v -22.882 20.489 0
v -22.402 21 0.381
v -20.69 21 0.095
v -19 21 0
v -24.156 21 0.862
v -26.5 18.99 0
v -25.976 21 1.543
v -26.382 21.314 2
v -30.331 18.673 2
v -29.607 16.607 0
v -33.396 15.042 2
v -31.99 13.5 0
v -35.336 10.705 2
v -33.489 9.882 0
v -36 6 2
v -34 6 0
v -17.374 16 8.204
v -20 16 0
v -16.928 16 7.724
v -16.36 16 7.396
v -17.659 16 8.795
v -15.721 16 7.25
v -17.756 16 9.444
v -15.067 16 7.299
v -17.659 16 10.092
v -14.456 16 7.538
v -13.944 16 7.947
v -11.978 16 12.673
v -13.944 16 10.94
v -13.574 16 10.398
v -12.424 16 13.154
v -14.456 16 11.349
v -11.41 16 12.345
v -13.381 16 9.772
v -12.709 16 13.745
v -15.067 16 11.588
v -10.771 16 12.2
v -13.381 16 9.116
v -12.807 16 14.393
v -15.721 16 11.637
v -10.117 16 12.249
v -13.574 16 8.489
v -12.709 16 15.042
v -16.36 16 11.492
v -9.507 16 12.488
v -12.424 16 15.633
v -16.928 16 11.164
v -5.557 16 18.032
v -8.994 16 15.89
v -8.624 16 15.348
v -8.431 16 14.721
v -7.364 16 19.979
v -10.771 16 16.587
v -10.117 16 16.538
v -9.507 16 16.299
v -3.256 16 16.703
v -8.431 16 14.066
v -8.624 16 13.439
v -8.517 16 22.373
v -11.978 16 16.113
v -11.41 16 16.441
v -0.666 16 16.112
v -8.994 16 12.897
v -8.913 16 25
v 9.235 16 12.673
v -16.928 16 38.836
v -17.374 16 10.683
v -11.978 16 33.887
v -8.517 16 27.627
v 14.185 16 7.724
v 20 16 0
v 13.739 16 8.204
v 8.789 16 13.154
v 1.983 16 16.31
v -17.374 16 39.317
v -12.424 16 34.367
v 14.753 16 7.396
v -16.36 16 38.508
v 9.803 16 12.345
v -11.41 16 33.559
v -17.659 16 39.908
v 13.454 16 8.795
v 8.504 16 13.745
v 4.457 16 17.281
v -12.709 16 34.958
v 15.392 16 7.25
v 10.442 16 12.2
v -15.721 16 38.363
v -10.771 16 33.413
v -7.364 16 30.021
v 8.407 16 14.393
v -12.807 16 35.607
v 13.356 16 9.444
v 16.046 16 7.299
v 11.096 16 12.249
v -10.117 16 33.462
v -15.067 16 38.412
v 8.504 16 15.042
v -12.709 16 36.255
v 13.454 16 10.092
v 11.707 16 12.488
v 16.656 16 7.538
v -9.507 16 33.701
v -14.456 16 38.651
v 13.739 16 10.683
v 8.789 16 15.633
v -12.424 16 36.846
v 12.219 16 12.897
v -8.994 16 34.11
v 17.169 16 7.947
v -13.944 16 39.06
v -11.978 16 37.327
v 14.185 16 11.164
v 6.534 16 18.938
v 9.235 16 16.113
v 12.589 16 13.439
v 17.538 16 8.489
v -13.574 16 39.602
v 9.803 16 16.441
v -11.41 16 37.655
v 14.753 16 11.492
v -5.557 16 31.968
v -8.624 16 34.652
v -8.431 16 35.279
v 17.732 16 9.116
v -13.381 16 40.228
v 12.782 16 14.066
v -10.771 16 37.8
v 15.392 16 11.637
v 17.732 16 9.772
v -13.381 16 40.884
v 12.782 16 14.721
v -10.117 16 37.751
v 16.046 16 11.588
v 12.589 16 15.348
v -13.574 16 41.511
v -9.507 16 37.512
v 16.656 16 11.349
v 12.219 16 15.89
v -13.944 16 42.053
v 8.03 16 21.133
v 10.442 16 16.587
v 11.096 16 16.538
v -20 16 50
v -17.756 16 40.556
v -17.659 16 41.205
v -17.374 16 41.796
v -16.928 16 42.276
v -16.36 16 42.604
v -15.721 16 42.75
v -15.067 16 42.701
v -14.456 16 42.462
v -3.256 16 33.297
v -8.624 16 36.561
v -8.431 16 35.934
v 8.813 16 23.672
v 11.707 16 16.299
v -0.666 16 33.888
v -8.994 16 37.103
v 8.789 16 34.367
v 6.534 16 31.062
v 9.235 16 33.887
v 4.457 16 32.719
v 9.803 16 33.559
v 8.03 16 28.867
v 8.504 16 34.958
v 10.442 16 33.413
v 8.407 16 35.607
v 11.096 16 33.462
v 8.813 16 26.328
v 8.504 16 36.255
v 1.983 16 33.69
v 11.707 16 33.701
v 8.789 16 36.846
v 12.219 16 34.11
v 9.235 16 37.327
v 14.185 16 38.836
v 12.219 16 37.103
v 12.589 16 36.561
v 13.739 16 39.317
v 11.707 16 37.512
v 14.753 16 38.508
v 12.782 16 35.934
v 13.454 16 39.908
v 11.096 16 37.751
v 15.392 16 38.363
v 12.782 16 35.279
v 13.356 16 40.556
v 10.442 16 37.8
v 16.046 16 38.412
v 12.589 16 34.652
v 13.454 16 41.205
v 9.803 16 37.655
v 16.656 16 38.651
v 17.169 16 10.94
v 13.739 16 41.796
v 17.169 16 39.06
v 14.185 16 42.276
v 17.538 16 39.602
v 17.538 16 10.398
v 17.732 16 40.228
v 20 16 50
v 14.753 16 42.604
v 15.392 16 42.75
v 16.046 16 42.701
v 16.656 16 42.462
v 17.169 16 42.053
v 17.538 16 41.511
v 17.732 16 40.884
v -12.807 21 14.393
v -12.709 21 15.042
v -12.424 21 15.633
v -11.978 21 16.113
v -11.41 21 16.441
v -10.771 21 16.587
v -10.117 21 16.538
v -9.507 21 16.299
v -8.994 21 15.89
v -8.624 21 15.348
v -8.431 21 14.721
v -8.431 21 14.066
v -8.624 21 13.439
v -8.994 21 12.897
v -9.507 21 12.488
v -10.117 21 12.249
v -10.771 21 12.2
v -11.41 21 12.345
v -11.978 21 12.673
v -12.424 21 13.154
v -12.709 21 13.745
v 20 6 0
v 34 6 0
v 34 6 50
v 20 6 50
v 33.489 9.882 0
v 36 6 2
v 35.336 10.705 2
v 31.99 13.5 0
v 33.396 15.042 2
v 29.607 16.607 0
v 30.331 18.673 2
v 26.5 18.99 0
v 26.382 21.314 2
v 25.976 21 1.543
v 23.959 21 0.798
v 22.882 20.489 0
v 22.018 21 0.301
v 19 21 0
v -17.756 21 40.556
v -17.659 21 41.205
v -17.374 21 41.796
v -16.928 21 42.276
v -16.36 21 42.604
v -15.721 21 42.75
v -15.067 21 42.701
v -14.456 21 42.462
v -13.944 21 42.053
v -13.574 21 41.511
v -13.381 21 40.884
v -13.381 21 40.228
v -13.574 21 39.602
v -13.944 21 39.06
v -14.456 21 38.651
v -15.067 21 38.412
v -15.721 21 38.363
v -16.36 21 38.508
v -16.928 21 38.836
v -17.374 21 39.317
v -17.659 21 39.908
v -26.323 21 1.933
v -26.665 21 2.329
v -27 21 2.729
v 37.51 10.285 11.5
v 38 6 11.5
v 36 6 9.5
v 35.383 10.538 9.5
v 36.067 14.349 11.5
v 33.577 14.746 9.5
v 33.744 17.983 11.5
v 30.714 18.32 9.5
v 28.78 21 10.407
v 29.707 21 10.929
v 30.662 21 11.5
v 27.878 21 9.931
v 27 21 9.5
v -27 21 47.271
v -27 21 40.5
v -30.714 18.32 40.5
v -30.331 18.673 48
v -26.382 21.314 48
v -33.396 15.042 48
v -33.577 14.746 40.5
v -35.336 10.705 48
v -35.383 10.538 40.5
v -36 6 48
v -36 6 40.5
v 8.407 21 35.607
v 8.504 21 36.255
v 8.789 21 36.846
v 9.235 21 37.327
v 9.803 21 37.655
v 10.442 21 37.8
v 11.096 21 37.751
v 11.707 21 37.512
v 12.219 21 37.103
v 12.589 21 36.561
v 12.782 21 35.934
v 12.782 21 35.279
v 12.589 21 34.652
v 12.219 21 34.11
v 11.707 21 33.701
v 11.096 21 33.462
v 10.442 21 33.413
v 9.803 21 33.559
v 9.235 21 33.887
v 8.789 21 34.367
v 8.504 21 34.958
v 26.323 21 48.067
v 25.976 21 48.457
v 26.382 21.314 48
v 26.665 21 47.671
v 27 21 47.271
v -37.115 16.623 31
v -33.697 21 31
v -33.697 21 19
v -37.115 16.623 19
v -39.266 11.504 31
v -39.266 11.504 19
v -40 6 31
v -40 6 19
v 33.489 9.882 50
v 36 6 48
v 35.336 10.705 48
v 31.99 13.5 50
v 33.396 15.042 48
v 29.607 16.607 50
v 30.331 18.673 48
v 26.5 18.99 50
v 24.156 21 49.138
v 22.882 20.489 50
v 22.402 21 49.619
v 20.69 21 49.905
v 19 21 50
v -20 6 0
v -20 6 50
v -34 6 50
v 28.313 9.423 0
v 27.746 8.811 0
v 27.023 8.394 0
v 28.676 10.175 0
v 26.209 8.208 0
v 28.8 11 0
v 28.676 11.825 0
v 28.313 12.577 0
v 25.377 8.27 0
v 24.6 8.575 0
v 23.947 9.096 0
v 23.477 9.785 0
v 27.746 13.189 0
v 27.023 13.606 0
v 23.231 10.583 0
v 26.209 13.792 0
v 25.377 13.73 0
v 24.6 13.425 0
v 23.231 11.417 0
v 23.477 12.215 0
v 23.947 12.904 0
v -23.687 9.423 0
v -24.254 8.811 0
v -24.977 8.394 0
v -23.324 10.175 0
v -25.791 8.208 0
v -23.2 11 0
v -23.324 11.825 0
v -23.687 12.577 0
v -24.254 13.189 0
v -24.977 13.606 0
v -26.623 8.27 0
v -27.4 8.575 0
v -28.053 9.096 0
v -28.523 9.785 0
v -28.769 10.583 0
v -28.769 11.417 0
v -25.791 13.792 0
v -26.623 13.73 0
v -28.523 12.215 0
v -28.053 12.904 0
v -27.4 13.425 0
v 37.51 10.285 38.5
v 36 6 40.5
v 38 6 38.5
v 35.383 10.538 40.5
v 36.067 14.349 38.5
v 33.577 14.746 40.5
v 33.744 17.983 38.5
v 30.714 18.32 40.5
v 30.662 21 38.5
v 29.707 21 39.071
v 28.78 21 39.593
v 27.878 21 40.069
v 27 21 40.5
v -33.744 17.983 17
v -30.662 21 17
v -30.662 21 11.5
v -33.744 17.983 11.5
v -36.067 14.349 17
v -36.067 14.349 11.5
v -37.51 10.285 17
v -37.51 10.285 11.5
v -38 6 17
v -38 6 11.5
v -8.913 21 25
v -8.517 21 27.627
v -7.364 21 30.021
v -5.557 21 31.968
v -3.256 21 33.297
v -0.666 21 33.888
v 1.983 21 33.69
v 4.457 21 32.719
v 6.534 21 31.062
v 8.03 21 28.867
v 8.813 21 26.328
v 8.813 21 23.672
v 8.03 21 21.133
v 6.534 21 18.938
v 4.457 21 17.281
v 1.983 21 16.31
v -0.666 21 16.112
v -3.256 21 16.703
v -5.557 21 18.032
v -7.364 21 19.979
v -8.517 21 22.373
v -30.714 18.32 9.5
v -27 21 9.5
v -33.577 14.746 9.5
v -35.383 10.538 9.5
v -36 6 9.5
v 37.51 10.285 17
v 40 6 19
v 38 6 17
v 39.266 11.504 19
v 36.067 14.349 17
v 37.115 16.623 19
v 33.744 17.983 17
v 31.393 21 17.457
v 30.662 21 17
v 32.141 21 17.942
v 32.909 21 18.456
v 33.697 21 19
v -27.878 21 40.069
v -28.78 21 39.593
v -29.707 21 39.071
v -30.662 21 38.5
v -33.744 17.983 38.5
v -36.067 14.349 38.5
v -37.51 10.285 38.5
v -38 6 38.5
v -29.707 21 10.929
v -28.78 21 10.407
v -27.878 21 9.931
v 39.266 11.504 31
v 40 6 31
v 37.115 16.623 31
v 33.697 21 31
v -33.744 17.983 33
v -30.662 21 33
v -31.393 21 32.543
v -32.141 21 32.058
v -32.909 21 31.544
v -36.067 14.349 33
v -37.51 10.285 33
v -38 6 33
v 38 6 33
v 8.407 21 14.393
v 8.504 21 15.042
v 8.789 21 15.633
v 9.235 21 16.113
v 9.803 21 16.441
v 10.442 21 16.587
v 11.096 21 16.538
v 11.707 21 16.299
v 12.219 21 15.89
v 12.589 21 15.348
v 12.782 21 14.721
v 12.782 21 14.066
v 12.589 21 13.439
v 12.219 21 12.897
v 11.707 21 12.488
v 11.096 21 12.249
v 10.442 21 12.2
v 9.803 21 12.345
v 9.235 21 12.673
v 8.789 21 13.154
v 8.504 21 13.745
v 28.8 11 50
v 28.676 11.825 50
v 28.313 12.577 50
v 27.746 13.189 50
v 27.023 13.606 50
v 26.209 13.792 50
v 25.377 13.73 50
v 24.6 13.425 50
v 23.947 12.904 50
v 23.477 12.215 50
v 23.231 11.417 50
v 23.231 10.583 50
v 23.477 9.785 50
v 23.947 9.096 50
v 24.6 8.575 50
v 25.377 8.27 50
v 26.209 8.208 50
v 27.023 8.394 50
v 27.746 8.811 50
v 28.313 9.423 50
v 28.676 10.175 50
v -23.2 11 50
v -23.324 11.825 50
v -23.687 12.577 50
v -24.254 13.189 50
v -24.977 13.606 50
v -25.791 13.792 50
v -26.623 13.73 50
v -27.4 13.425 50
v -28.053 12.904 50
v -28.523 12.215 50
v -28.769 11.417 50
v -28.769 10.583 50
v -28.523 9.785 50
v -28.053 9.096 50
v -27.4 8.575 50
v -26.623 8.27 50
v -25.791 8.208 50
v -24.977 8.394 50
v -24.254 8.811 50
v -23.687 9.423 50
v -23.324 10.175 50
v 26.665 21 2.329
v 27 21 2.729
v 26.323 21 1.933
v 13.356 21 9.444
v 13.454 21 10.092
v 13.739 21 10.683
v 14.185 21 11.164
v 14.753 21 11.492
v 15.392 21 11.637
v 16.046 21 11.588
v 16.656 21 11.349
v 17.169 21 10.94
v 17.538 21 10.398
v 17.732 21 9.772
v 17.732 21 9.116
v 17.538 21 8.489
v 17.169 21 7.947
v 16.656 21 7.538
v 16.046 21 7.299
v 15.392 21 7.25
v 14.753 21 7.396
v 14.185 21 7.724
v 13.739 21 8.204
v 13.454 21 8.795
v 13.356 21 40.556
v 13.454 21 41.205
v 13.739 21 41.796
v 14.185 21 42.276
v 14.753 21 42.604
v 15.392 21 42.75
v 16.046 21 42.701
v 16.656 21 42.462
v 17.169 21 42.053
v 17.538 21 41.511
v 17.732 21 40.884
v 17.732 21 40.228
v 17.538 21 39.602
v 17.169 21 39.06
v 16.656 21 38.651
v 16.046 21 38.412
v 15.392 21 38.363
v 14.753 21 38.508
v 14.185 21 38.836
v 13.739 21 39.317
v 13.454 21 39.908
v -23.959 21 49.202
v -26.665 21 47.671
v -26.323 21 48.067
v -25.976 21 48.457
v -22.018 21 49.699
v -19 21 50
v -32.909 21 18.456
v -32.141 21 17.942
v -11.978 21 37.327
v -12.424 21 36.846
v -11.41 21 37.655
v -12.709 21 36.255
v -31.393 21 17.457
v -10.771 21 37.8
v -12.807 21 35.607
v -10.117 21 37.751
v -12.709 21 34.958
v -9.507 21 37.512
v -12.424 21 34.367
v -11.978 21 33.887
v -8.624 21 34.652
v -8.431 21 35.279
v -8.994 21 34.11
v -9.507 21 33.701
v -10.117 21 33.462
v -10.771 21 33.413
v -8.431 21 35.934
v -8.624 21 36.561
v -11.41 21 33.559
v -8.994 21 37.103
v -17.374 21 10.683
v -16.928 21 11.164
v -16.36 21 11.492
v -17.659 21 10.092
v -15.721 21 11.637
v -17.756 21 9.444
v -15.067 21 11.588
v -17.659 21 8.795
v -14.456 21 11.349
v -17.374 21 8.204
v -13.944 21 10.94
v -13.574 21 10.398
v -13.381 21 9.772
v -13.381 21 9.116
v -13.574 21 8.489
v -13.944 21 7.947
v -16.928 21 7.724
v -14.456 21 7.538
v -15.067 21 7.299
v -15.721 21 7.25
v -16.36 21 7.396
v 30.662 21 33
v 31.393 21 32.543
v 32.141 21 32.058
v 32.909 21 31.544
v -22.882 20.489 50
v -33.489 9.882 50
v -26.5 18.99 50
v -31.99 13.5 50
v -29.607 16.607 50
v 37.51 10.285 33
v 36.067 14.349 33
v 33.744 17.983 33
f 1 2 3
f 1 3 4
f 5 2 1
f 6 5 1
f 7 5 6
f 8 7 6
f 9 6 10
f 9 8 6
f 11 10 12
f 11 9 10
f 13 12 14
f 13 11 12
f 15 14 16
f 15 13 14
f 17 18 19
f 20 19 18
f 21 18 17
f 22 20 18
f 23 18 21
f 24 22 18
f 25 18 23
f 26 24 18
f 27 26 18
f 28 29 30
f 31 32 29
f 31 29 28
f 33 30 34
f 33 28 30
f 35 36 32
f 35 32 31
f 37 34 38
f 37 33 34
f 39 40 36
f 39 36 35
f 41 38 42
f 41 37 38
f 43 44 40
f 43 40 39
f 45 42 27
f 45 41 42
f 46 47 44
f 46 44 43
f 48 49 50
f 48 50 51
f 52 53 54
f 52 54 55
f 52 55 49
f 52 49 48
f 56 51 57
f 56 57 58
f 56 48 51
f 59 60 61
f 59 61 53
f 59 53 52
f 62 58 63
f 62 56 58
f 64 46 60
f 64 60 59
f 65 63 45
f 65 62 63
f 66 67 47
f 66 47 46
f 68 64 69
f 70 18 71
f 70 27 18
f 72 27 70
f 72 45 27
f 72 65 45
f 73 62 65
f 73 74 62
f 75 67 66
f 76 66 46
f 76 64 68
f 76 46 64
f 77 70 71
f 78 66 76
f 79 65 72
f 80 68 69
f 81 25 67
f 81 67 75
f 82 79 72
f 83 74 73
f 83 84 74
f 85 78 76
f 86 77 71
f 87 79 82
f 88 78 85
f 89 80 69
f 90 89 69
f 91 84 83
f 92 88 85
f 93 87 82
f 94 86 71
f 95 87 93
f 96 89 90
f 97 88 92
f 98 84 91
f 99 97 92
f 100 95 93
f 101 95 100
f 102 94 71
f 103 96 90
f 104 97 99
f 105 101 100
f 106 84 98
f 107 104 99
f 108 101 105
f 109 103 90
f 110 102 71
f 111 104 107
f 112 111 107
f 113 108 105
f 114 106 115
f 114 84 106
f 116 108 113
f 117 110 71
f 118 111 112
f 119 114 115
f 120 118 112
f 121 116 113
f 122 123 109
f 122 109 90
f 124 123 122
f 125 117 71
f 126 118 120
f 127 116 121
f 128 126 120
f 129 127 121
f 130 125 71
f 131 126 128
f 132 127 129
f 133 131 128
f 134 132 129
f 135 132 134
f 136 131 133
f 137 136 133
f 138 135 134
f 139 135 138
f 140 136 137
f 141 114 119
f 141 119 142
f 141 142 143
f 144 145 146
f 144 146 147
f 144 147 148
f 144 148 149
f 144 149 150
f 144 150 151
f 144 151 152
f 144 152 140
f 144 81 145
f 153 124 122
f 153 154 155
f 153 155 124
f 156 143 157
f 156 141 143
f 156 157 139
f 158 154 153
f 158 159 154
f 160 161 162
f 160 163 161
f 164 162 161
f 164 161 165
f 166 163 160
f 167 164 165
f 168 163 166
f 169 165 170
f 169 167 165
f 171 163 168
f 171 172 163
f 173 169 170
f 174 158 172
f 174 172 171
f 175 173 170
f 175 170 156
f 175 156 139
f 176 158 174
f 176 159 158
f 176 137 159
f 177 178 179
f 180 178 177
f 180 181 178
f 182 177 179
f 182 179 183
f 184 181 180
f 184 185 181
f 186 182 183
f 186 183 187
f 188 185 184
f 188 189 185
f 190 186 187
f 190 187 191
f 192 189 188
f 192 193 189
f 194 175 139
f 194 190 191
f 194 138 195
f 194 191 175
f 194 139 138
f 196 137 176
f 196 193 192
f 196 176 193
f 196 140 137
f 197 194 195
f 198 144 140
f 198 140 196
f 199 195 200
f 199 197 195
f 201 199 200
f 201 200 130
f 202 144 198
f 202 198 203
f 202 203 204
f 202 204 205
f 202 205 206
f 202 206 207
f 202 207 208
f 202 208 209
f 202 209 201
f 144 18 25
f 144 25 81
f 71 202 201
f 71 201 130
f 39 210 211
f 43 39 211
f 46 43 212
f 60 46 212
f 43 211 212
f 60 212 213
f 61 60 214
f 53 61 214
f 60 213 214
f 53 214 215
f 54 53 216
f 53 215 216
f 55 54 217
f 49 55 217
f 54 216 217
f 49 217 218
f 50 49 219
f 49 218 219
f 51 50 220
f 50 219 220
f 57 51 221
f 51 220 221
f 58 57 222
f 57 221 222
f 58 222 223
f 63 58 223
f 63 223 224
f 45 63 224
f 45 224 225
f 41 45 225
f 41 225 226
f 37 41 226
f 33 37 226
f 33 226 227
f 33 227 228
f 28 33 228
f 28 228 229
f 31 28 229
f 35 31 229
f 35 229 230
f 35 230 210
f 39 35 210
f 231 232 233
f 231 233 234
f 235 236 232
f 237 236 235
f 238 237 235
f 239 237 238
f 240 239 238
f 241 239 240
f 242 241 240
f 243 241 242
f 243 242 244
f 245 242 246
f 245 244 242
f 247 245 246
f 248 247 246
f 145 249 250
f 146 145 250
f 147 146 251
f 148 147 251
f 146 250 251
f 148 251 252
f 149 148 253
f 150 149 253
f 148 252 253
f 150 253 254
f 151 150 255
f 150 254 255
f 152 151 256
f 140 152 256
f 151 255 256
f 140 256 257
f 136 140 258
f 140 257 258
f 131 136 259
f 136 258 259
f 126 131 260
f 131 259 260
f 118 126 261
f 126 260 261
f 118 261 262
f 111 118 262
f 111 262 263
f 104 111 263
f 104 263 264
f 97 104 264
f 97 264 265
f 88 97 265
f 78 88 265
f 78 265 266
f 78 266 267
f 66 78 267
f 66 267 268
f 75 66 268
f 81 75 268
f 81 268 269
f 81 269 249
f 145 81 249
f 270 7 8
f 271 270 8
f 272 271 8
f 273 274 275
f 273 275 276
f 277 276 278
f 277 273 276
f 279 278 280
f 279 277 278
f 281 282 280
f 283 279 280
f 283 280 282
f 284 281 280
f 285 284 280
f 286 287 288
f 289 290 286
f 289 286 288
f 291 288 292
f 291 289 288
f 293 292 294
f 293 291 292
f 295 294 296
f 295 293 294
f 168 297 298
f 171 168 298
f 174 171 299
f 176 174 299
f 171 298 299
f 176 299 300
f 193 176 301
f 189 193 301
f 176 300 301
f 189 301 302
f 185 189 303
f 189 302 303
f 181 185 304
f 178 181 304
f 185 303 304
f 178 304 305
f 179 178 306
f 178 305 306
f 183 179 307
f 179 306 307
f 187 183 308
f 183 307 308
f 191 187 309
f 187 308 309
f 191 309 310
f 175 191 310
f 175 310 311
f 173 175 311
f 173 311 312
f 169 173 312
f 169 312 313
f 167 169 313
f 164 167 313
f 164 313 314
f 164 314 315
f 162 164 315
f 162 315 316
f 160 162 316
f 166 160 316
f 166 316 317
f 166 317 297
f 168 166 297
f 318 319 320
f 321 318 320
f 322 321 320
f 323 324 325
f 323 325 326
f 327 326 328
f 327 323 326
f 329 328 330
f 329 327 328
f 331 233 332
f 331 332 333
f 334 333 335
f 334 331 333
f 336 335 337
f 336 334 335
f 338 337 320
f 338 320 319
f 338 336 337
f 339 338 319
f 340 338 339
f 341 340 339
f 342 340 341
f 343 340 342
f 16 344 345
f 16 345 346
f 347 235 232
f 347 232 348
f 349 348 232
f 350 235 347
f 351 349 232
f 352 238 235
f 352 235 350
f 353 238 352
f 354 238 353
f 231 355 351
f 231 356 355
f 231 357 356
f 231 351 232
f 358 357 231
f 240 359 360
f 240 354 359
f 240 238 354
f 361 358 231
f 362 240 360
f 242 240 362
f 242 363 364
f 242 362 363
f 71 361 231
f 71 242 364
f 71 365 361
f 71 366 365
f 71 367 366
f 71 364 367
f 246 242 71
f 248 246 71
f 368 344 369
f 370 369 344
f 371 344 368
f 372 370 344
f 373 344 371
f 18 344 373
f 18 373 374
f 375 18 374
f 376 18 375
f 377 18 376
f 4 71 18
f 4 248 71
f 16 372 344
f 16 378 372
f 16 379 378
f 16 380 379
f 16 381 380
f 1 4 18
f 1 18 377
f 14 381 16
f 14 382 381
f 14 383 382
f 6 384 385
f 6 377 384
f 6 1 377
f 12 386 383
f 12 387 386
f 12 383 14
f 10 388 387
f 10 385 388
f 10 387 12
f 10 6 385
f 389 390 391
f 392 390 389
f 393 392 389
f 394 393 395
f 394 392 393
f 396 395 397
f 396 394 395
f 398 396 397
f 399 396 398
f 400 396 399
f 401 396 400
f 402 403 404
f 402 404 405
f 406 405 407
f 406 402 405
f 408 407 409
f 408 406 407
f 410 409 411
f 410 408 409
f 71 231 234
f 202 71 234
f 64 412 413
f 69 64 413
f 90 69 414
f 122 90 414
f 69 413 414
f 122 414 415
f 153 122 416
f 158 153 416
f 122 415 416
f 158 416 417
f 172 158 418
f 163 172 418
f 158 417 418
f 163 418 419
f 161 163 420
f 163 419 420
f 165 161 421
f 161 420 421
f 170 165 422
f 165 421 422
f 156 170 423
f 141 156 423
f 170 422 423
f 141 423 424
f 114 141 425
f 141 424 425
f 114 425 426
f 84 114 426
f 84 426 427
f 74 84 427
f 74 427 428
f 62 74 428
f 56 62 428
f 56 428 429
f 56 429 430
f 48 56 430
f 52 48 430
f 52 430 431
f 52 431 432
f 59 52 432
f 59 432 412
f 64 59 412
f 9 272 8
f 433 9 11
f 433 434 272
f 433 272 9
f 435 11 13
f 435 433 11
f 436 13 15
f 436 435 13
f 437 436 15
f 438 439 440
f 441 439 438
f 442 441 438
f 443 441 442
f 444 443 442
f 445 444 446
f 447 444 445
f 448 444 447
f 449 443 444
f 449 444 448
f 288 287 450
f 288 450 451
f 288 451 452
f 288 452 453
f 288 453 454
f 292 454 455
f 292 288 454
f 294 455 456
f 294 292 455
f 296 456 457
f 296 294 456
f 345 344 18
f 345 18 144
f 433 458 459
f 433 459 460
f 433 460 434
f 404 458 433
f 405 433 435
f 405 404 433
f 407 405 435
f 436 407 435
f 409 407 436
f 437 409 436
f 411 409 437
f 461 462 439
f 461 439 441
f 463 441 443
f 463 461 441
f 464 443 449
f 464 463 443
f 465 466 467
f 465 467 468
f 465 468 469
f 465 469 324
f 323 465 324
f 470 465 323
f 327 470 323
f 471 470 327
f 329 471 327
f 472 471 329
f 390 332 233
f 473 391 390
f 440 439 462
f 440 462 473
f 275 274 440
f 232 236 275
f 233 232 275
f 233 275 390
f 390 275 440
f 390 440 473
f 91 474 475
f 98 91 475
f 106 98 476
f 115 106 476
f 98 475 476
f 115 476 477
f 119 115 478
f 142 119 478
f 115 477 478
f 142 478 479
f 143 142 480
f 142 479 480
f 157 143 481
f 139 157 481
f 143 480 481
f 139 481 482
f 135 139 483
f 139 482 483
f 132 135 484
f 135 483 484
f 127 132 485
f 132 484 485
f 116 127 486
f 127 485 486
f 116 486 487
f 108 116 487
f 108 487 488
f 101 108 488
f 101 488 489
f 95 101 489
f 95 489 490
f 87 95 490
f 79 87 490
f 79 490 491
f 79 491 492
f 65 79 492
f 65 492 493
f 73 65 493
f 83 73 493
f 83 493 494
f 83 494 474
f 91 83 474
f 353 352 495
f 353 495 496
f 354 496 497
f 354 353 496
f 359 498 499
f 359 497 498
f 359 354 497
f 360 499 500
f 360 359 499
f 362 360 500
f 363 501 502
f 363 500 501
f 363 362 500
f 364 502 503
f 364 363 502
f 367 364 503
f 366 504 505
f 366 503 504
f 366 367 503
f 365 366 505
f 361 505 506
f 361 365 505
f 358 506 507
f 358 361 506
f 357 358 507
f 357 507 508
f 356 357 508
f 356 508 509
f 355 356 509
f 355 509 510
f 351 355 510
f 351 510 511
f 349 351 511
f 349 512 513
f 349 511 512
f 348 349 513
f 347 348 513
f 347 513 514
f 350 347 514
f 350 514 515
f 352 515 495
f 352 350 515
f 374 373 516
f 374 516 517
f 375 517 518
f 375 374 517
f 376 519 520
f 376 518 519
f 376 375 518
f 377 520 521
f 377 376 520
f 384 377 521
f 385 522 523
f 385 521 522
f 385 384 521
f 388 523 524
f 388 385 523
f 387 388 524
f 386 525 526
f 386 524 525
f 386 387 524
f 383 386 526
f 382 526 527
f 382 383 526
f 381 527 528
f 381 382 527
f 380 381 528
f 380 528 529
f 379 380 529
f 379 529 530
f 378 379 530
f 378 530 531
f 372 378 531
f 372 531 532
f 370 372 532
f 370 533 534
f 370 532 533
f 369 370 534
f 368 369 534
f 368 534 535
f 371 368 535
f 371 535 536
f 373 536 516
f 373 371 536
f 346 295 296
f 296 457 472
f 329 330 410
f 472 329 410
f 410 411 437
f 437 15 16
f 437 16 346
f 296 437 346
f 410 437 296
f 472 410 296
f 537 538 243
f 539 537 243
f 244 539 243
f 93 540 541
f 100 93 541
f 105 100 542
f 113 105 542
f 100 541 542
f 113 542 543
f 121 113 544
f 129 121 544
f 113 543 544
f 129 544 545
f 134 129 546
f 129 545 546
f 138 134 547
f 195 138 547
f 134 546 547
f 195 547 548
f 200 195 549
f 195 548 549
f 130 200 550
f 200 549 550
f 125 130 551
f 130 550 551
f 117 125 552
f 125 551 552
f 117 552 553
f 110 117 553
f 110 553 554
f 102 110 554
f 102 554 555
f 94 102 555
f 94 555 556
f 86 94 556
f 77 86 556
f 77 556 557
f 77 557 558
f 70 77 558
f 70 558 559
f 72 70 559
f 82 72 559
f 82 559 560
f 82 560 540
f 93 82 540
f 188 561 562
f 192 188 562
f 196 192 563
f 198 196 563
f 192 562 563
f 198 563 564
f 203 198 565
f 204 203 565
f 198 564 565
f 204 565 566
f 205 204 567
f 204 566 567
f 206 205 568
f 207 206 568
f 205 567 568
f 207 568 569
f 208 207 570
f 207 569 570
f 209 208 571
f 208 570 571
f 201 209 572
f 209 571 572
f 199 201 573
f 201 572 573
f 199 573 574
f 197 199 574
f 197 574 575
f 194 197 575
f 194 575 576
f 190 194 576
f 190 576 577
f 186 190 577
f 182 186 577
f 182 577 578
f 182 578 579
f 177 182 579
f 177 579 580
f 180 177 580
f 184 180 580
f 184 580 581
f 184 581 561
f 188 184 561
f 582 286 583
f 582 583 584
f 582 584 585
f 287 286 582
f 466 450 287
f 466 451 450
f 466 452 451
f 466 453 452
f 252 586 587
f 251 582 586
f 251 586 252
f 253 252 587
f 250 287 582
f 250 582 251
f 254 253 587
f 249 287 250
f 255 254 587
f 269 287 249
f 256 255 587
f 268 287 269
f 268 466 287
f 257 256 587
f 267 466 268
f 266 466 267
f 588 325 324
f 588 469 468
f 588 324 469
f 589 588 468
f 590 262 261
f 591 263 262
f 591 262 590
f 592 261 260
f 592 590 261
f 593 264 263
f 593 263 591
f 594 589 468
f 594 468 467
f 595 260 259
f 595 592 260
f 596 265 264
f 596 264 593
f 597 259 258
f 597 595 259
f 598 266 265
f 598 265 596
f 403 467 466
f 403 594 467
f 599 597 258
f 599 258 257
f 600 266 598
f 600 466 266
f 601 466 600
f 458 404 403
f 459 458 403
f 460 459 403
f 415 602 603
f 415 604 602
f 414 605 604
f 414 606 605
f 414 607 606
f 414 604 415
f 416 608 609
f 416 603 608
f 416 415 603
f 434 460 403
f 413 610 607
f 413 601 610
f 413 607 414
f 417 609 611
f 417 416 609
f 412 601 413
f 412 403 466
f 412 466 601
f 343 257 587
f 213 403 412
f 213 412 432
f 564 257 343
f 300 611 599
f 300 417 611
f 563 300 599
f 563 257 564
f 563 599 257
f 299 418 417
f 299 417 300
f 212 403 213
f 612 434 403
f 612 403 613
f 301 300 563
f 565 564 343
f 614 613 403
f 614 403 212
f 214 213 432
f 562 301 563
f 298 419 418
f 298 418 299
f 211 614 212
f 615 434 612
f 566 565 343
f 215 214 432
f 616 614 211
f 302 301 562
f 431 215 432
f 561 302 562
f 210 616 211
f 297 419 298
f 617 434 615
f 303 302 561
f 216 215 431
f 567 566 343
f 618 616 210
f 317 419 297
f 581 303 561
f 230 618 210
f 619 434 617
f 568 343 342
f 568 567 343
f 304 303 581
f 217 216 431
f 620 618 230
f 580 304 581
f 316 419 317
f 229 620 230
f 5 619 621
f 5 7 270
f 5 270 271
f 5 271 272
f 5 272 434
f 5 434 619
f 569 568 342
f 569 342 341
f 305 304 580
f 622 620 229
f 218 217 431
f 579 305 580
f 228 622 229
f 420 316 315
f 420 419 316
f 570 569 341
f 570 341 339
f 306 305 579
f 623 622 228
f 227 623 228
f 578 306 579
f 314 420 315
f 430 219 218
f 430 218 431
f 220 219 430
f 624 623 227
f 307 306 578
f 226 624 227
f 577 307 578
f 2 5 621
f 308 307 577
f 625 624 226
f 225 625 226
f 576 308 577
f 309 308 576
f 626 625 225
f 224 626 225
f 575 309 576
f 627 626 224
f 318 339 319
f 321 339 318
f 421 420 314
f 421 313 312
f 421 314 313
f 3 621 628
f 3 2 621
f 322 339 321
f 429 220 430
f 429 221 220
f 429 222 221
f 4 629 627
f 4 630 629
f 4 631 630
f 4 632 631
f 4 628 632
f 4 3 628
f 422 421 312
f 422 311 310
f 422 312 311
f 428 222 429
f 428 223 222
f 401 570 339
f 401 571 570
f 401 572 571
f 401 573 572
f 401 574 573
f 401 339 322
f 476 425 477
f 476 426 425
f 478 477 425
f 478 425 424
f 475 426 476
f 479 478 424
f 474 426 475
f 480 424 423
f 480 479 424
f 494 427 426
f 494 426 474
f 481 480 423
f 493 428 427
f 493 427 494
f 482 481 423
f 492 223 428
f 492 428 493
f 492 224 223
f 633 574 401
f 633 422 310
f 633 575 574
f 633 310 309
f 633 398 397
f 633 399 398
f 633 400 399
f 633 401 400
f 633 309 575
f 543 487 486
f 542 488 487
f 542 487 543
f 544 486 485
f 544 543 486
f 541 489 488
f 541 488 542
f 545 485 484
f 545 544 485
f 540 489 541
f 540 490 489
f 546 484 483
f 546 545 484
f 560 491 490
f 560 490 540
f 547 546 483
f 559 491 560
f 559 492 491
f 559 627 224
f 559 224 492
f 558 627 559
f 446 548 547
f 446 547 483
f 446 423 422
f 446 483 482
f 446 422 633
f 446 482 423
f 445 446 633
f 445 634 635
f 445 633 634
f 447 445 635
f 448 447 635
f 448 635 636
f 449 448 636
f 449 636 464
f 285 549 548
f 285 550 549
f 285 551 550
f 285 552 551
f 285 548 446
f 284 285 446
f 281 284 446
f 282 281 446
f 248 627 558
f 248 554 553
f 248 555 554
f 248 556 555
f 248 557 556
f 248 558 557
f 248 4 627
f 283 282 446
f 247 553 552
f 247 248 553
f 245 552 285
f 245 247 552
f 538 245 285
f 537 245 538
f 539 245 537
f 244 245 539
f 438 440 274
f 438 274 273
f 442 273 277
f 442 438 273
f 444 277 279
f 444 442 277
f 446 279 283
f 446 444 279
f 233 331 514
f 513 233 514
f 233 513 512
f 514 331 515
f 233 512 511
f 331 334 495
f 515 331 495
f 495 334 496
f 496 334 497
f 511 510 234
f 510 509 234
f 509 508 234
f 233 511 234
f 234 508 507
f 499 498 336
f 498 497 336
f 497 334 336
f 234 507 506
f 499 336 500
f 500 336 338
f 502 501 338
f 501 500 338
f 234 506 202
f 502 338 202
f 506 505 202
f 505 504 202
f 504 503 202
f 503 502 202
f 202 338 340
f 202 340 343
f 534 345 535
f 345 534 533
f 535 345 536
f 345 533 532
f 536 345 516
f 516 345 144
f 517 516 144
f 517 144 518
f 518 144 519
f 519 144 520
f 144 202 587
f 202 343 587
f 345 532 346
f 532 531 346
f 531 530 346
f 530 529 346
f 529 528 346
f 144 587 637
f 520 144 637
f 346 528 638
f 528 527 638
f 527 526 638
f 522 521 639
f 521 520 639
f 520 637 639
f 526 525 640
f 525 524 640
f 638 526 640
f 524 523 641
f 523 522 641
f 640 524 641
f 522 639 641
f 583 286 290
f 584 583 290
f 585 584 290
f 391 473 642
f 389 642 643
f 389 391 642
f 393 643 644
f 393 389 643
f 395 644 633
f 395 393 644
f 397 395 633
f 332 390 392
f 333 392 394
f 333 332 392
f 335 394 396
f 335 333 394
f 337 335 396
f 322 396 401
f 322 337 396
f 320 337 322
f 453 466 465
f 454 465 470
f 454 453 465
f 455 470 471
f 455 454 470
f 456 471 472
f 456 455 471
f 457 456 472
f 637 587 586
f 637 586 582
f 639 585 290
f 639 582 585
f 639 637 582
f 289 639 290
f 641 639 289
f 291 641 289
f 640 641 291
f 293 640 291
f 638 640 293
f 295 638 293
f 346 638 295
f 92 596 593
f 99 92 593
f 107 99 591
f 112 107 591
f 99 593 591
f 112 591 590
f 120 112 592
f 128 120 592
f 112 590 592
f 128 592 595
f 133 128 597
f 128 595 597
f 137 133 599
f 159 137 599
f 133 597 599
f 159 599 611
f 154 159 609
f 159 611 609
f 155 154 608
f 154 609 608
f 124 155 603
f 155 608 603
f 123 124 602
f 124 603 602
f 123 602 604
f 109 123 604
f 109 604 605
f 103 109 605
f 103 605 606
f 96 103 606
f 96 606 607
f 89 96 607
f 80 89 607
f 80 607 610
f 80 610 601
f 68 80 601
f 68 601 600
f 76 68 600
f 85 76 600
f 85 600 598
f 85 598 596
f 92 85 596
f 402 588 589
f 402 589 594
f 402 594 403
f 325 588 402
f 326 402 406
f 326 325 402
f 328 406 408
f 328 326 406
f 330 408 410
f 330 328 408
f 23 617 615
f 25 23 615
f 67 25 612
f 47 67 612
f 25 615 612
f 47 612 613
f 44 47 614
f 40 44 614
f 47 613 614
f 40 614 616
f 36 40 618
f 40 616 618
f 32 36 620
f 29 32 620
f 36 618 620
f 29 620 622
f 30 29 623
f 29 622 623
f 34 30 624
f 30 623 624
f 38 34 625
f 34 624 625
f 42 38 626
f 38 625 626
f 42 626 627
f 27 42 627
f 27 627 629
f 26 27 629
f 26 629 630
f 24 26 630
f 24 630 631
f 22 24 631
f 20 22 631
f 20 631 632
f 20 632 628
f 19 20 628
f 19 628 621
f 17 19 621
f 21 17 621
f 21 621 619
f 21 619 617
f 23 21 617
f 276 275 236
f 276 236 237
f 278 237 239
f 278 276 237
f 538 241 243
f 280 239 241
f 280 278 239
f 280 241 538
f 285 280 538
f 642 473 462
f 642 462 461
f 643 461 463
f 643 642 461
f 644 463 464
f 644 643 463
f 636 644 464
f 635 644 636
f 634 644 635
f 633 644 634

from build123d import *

# Parameters (mm, degrees)
BOSS_EXTRUDE1_DEPTH     = 50
SKETCH5_W               = 40
SKETCH5_H               = 50
CUT_EXTRUDE4_DEPTH      = 10
SKETCH6_R               = 7.5
CUT_EXTRUDE5_DEPTH      = 15
CUT_EXTRUDE6_DEPTH      = 65.007812023
CUT_EXTRUDE6_DEPTH_BACK = 65.007812023
SKETCH7_R               = 2.8
SKETCH8_R               = 8.913017029
SKETCH8_R_2             = 2.2
CUT_EXTRUDE7_DEPTH      = 10
SKETCH12_R              = 35
CUT_EXTRUDE8_DEPTH      = 6


with BuildPart() as part:
    # Sketch1 → Boss-Extrude1 (new body)
    with BuildSketch(Plane.XY):
        with BuildLine():
            Line((34, 6), (-34, 6))
            ThreePointArc((-34, 6), (-29.606601718, 16.606601718), (-19, 21))
            Line((-19, 21), (19, 21))
            ThreePointArc((19, 21), (29.606601718, 16.606601718), (34, 6))
        make_face()
    extrude(amount=BOSS_EXTRUDE1_DEPTH)

    # Sketch5 → Cut-Extrude4 (cut)
    with BuildSketch(Plane.XZ.offset(-6)):
        with Locations((0, 25)):
            Rectangle(SKETCH5_W, SKETCH5_H)
    extrude(amount=-CUT_EXTRUDE4_DEPTH, mode=Mode.SUBTRACT)

    # Sketch6 → Cut-Extrude5 (cut)
    with BuildSketch(Plane(origin=(0, 21, 0), x_dir=(1, 0, 0), z_dir=(0, 1, 0))):
        with Locations(Location((0, -25, 0), (0, 0, 270))):
            Circle(SKETCH6_R)
    extrude(amount=-CUT_EXTRUDE5_DEPTH, mode=Mode.SUBTRACT)

    # Sketch7 → Cut-Extrude6 (cut, two sides: drawn at the far end of the back side and taken through both)
    with BuildSketch(Plane.XY.offset(50).offset(-CUT_EXTRUDE6_DEPTH_BACK)):
        with Locations((-26, 11)):
            Circle(SKETCH7_R)
        with Locations((26, 11)):
            Circle(SKETCH7_R)
    extrude(amount=CUT_EXTRUDE6_DEPTH + CUT_EXTRUDE6_DEPTH_BACK, mode=Mode.SUBTRACT)

    # Sketch8 → Cut-Extrude7 (cut)
    with BuildSketch(Plane(origin=(0, 21, 0), x_dir=(1, 0, 0), z_dir=(0, 1, 0))):
        with Locations(Location((0, -25, 0), (0, 0, 180))):
            Circle(SKETCH8_R)
        with Locations(Location((10.606601718, -14.393398282, 0), (0, 0, 180))):
            Circle(SKETCH8_R_2)
        with Locations(Location((15.556349186, -9.443650814, 0), (0, 0, 180))):
            Circle(SKETCH8_R_2)
        with Locations(Location((-10.606601718, -14.393398282, 0), (0, 0, 180))):
            Circle(SKETCH8_R_2)
        with Locations(Location((-15.556349186, -9.443650814, 0), (0, 0, 180))):
            Circle(SKETCH8_R_2)
        with Locations(Location((-10.606601718, -35.606601718, 0), (0, 0, 180))):
            Circle(SKETCH8_R_2)
        with Locations(Location((-15.556349186, -40.556349186, 0), (0, 0, 180))):
            Circle(SKETCH8_R_2)
        with Locations(Location((10.606601718, -35.606601718, 0), (0, 0, 180))):
            Circle(SKETCH8_R_2)
        with Locations(Location((15.556349186, -40.556349186, 0), (0, 0, 180))):
            Circle(SKETCH8_R_2)
    extrude(amount=-CUT_EXTRUDE7_DEPTH, mode=Mode.SUBTRACT)

    # Sweep2: sweep along a path in Sketch11
    with BuildLine(Plane(origin=(0, 0, 0), x_dir=(-1, 0, 0), z_dir=(0, 0, -1))) as sweep2_path:
        ThreePointArc((-34, 6), (-29.606601718, 16.606601718), (-19, 21))
        Line((-19, 21), (19, 21))
        ThreePointArc((19, 21), (29.606601718, 16.606601718), (34, 6))
    # Sketch9 → Sweep2 (sweep)
    with BuildSketch(Plane.XZ.offset(-6)):
        Polygon((34, 0), (36, 2), (36, 9.5), (38, 11.5), (38, 17), (40, 19), (40, 31), (38, 33), (38, 38.5), (36, 40.5), (36, 48), (34, 50), align=None)
    sweep(path=sweep2_path.line)

    # Sketch12 → Cut-Extrude8 (cut)
    with BuildSketch(Plane(origin=(0, 27, 0), x_dir=(1, 0, 0), z_dir=(0, 1, 0))):
        with Locations((0, -25)):
            Circle(SKETCH12_R)
    extrude(amount=-CUT_EXTRUDE8_DEPTH, mode=Mode.SUBTRACT)


solid = part.part
